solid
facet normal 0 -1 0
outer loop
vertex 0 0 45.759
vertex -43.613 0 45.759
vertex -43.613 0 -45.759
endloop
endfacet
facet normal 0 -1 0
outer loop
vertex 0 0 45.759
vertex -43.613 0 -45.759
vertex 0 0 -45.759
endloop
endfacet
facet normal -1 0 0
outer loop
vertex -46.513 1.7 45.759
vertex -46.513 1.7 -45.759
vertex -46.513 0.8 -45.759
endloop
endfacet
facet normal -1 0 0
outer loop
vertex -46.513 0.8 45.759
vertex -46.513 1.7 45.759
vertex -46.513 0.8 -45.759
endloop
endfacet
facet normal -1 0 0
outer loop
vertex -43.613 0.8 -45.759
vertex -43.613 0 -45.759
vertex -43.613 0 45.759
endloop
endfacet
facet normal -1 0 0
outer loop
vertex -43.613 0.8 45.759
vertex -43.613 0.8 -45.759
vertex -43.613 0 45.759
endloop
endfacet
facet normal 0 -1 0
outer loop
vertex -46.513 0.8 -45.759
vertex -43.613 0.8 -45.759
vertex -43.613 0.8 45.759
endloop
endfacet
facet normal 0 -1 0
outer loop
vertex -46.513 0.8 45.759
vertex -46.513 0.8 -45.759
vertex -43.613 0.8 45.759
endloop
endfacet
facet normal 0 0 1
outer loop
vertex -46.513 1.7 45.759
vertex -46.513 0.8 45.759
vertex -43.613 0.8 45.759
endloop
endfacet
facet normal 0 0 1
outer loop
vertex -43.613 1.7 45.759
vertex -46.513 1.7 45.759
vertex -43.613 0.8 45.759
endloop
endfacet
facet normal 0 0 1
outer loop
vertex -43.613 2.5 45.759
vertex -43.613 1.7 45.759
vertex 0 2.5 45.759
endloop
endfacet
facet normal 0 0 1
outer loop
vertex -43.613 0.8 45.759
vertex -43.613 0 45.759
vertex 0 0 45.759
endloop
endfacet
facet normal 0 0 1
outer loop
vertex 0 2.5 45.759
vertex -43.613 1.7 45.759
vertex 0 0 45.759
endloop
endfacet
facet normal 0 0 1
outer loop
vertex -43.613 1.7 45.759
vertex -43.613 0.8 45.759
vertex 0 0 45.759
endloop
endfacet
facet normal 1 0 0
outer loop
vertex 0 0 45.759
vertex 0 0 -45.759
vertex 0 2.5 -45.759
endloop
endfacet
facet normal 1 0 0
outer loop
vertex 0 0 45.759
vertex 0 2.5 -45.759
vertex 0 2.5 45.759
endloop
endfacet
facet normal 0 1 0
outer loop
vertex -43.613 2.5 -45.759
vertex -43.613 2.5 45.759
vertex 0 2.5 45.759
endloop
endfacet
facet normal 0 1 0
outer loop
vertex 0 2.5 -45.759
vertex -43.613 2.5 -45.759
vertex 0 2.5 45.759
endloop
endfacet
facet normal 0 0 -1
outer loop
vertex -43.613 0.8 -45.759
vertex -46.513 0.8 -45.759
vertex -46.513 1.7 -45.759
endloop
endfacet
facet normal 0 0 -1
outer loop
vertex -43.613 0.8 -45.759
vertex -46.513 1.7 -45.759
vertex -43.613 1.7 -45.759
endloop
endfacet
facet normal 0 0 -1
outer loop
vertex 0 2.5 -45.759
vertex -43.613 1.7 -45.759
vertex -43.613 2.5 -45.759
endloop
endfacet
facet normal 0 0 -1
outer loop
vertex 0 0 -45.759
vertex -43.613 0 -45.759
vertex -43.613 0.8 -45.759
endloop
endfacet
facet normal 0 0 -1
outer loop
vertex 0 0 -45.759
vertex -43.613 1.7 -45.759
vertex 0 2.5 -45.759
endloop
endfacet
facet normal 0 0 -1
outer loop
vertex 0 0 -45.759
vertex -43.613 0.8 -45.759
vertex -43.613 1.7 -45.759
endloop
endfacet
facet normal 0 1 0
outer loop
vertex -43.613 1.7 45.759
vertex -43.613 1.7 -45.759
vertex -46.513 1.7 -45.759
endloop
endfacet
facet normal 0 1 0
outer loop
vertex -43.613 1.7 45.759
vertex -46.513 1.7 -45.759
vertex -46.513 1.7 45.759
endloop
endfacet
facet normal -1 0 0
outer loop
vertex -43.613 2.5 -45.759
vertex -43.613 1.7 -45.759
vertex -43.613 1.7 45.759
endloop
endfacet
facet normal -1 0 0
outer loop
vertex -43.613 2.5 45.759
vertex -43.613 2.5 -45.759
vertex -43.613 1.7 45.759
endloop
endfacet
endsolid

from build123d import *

# Parameters (mm, degrees)
F0_W     = 43.6125099659
F0_H     = 91.5184393525
F1_DEPTH = 2.5
F2_W     = 0.9
F2_H     = 91.5184393525
F3_DEPTH = 2.9


# Not quite as in the source:
# - a feature of the source that left no trace in its solid (it failed there, or was rolled back) is left out


with BuildPart() as f1:
    # F0 (on Front) → F1 (new body)
    with BuildSketch(Plane.XZ):
        with Locations((-21.8062549829, 0)):
            Rectangle(F0_W, F0_H)
    extrude(amount=-F1_DEPTH)

    # F2 (on face) → F3 (join)
    with BuildSketch(Plane(origin=(-43.6125099659, 0, 0), x_dir=(0, -1, 0), z_dir=(-1, 0, 0))):
        with Locations((-1.25, 0)):
            Rectangle(F2_W, F2_H)
    extrude(amount=F3_DEPTH)


solid = f1.part
